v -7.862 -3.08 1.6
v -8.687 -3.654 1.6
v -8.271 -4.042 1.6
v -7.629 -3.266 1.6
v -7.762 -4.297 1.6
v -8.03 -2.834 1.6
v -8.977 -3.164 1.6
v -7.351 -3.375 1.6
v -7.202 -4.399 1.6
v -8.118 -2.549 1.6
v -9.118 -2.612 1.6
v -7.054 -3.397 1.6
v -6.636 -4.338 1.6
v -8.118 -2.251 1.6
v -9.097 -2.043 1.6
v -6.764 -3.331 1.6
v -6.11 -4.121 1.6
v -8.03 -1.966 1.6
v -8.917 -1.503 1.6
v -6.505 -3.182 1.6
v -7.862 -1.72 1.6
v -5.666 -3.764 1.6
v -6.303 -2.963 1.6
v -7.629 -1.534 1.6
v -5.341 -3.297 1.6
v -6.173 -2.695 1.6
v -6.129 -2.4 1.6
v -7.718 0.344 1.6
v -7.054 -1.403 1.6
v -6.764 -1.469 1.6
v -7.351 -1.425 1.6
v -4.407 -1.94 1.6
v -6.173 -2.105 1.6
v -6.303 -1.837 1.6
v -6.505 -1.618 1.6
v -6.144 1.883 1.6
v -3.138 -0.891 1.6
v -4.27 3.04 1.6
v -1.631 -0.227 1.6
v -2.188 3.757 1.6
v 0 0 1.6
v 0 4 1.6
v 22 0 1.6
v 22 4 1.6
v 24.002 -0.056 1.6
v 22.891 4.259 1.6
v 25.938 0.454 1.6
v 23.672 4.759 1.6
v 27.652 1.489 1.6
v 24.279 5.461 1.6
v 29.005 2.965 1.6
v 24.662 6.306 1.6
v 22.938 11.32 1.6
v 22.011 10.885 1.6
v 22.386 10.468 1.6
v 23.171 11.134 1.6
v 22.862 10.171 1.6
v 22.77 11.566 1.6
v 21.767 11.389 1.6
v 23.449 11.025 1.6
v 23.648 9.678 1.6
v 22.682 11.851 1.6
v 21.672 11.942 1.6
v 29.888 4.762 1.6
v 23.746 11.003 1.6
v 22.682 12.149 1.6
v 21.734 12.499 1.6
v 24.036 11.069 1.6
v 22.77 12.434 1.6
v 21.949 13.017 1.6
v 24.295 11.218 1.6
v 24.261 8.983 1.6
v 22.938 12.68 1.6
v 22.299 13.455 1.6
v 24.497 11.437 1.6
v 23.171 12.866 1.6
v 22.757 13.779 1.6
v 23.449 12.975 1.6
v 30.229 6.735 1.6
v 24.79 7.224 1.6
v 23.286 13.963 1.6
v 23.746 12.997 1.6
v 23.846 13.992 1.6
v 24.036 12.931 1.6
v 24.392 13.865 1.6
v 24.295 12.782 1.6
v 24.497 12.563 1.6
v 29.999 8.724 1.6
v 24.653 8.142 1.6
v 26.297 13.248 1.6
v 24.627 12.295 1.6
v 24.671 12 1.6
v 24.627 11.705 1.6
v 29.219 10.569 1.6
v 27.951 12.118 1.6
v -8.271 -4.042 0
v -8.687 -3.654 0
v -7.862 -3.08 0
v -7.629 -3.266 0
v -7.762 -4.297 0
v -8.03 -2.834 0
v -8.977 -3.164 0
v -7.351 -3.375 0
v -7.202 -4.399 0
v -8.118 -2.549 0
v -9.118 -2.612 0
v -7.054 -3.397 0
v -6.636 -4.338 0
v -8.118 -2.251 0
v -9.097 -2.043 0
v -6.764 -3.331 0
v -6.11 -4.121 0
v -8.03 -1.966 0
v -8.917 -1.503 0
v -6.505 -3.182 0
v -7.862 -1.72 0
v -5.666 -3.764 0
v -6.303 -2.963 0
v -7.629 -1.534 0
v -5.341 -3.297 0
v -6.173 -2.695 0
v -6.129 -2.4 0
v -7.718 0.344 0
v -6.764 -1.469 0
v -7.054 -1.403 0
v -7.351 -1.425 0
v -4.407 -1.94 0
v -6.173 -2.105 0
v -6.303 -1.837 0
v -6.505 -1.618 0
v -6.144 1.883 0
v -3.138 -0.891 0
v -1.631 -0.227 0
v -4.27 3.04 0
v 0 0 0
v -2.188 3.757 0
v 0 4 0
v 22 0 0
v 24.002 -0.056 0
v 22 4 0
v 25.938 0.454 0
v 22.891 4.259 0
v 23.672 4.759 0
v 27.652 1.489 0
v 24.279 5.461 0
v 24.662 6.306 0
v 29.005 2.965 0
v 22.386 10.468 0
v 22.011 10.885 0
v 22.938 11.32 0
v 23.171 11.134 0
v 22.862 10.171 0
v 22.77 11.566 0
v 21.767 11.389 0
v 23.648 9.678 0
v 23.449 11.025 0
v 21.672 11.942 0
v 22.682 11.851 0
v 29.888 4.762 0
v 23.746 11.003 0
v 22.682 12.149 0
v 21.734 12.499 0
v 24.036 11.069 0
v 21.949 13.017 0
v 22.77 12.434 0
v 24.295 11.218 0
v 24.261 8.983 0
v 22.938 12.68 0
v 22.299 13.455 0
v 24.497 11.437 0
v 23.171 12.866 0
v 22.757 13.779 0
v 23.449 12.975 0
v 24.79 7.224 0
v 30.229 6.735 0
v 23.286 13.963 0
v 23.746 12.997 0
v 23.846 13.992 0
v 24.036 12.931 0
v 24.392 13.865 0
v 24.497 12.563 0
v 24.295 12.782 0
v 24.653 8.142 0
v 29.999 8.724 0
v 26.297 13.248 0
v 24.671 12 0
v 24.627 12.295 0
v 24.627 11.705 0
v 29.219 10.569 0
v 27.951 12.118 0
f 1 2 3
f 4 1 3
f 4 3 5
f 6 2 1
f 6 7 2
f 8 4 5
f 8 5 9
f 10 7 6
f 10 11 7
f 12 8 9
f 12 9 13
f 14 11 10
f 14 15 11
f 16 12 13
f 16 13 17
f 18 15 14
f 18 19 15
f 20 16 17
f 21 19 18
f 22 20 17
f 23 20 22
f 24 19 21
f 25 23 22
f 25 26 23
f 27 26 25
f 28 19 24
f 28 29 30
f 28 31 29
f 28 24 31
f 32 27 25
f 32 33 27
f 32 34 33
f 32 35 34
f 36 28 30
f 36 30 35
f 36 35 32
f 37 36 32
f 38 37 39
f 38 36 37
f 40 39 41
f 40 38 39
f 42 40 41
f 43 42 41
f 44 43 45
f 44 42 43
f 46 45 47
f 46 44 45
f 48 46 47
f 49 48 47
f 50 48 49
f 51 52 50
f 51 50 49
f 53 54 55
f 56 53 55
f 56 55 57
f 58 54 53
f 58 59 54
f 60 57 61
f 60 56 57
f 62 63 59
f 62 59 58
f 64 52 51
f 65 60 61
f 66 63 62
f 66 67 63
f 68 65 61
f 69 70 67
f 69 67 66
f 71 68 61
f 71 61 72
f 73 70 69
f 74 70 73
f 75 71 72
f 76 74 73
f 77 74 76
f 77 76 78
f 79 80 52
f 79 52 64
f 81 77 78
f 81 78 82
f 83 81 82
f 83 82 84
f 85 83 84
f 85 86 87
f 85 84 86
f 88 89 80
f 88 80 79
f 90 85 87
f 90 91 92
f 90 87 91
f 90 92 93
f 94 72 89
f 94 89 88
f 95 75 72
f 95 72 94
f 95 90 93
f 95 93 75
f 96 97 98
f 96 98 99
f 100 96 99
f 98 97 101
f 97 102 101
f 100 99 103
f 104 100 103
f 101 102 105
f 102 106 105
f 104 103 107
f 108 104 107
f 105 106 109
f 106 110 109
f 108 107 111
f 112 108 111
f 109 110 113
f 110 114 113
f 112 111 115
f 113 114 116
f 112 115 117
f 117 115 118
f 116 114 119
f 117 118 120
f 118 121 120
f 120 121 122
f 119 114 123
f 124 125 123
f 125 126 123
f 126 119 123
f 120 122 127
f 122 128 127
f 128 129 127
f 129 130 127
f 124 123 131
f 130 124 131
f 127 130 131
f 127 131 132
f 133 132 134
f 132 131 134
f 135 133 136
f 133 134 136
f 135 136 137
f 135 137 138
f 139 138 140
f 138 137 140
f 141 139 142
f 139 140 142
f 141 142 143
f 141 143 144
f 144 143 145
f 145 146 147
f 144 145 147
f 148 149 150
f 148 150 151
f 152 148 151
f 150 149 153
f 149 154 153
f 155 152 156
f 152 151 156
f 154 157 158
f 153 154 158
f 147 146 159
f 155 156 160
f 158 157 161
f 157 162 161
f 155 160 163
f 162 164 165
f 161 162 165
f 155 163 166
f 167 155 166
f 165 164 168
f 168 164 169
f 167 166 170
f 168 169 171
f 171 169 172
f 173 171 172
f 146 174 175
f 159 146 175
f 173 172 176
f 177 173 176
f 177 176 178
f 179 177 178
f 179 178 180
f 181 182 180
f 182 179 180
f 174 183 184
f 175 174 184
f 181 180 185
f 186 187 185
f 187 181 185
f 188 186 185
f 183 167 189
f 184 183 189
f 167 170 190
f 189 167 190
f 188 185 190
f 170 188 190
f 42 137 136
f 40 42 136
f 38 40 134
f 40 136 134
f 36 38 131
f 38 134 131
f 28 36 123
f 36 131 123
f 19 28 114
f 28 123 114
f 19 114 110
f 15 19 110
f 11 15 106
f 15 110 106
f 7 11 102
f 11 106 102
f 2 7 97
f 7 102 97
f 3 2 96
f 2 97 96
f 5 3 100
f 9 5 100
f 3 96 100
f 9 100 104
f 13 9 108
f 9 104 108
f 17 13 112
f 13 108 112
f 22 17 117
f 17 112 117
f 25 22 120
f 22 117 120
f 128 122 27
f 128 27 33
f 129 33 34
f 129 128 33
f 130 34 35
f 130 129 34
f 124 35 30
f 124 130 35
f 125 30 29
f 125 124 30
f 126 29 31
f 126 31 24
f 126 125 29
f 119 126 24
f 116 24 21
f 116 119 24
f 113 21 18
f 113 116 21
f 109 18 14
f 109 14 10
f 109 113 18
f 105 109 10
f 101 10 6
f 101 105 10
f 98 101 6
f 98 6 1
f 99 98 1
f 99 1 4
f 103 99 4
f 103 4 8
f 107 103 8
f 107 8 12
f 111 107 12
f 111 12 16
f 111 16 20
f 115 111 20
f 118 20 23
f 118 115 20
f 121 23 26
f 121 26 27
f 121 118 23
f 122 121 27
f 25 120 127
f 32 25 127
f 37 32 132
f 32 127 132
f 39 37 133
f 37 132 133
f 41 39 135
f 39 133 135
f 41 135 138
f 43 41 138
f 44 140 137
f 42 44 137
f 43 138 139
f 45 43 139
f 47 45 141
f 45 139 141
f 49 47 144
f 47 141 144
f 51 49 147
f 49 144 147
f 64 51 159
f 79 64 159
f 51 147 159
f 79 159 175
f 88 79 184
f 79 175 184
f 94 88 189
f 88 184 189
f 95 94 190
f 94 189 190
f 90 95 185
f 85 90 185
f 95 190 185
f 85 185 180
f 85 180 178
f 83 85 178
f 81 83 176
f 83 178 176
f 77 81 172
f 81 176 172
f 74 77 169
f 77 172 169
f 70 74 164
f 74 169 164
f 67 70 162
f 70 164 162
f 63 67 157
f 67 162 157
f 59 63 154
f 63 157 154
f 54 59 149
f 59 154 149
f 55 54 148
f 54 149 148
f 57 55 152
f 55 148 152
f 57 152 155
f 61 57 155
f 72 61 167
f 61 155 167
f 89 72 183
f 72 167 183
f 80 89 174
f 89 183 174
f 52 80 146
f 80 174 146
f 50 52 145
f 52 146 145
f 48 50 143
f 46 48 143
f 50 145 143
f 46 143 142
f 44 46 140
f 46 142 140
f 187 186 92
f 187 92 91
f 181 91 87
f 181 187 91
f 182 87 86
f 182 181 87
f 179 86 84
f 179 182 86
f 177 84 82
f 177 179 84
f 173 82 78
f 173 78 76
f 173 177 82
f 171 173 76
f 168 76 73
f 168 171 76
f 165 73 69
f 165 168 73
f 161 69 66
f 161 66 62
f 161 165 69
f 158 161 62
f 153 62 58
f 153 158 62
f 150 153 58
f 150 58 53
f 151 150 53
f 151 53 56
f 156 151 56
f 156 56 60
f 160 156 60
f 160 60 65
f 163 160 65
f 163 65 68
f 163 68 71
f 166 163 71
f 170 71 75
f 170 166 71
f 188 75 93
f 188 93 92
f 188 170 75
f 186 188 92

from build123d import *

# Parameters (mm, degrees)
SKETCH1_R           = 1
BOSS_EXTRUDE2_DEPTH = 1.6


with BuildPart() as part:
    # Sketch1 → Boss-Extrude2 (new body)
    with BuildSketch(Plane.XY):
        with BuildLine():
            Line((0, 0), (22, 0))
            ThreePointArc((22, 0), (30.128904766, 5.736453046), (24.39245172, 13.865357811))
            ThreePointArc((24.39245172, 13.865357811), (21.823365484, 12.765579929), (22.861725051, 10.171061692))
            ThreePointArc((22.861725051, 10.171061692), (24.759347978, 6.760381893), (22, 4))
            Line((22, 4), (0, 4))
            ThreePointArc((0, 4), (-5.239174154, 2.513368319), (-8.916737512, -1.503414886))
            ThreePointArc((-8.916737512, -1.503414886), (-8.025548834, -4.187773792), (-5.341189927, -3.296585114))
            ThreePointArc((-5.341189927, -3.296585114), (-3.138303015, -0.890503073), (0, 0))
        make_face()
        with Locations((-7.128963719, -2.4)):
            Circle(SKETCH1_R, mode=Mode.SUBTRACT)
        with Locations((23.671036281, 12)):
            Circle(SKETCH1_R, mode=Mode.SUBTRACT)
    extrude(amount=BOSS_EXTRUDE2_DEPTH)


solid = part.part
